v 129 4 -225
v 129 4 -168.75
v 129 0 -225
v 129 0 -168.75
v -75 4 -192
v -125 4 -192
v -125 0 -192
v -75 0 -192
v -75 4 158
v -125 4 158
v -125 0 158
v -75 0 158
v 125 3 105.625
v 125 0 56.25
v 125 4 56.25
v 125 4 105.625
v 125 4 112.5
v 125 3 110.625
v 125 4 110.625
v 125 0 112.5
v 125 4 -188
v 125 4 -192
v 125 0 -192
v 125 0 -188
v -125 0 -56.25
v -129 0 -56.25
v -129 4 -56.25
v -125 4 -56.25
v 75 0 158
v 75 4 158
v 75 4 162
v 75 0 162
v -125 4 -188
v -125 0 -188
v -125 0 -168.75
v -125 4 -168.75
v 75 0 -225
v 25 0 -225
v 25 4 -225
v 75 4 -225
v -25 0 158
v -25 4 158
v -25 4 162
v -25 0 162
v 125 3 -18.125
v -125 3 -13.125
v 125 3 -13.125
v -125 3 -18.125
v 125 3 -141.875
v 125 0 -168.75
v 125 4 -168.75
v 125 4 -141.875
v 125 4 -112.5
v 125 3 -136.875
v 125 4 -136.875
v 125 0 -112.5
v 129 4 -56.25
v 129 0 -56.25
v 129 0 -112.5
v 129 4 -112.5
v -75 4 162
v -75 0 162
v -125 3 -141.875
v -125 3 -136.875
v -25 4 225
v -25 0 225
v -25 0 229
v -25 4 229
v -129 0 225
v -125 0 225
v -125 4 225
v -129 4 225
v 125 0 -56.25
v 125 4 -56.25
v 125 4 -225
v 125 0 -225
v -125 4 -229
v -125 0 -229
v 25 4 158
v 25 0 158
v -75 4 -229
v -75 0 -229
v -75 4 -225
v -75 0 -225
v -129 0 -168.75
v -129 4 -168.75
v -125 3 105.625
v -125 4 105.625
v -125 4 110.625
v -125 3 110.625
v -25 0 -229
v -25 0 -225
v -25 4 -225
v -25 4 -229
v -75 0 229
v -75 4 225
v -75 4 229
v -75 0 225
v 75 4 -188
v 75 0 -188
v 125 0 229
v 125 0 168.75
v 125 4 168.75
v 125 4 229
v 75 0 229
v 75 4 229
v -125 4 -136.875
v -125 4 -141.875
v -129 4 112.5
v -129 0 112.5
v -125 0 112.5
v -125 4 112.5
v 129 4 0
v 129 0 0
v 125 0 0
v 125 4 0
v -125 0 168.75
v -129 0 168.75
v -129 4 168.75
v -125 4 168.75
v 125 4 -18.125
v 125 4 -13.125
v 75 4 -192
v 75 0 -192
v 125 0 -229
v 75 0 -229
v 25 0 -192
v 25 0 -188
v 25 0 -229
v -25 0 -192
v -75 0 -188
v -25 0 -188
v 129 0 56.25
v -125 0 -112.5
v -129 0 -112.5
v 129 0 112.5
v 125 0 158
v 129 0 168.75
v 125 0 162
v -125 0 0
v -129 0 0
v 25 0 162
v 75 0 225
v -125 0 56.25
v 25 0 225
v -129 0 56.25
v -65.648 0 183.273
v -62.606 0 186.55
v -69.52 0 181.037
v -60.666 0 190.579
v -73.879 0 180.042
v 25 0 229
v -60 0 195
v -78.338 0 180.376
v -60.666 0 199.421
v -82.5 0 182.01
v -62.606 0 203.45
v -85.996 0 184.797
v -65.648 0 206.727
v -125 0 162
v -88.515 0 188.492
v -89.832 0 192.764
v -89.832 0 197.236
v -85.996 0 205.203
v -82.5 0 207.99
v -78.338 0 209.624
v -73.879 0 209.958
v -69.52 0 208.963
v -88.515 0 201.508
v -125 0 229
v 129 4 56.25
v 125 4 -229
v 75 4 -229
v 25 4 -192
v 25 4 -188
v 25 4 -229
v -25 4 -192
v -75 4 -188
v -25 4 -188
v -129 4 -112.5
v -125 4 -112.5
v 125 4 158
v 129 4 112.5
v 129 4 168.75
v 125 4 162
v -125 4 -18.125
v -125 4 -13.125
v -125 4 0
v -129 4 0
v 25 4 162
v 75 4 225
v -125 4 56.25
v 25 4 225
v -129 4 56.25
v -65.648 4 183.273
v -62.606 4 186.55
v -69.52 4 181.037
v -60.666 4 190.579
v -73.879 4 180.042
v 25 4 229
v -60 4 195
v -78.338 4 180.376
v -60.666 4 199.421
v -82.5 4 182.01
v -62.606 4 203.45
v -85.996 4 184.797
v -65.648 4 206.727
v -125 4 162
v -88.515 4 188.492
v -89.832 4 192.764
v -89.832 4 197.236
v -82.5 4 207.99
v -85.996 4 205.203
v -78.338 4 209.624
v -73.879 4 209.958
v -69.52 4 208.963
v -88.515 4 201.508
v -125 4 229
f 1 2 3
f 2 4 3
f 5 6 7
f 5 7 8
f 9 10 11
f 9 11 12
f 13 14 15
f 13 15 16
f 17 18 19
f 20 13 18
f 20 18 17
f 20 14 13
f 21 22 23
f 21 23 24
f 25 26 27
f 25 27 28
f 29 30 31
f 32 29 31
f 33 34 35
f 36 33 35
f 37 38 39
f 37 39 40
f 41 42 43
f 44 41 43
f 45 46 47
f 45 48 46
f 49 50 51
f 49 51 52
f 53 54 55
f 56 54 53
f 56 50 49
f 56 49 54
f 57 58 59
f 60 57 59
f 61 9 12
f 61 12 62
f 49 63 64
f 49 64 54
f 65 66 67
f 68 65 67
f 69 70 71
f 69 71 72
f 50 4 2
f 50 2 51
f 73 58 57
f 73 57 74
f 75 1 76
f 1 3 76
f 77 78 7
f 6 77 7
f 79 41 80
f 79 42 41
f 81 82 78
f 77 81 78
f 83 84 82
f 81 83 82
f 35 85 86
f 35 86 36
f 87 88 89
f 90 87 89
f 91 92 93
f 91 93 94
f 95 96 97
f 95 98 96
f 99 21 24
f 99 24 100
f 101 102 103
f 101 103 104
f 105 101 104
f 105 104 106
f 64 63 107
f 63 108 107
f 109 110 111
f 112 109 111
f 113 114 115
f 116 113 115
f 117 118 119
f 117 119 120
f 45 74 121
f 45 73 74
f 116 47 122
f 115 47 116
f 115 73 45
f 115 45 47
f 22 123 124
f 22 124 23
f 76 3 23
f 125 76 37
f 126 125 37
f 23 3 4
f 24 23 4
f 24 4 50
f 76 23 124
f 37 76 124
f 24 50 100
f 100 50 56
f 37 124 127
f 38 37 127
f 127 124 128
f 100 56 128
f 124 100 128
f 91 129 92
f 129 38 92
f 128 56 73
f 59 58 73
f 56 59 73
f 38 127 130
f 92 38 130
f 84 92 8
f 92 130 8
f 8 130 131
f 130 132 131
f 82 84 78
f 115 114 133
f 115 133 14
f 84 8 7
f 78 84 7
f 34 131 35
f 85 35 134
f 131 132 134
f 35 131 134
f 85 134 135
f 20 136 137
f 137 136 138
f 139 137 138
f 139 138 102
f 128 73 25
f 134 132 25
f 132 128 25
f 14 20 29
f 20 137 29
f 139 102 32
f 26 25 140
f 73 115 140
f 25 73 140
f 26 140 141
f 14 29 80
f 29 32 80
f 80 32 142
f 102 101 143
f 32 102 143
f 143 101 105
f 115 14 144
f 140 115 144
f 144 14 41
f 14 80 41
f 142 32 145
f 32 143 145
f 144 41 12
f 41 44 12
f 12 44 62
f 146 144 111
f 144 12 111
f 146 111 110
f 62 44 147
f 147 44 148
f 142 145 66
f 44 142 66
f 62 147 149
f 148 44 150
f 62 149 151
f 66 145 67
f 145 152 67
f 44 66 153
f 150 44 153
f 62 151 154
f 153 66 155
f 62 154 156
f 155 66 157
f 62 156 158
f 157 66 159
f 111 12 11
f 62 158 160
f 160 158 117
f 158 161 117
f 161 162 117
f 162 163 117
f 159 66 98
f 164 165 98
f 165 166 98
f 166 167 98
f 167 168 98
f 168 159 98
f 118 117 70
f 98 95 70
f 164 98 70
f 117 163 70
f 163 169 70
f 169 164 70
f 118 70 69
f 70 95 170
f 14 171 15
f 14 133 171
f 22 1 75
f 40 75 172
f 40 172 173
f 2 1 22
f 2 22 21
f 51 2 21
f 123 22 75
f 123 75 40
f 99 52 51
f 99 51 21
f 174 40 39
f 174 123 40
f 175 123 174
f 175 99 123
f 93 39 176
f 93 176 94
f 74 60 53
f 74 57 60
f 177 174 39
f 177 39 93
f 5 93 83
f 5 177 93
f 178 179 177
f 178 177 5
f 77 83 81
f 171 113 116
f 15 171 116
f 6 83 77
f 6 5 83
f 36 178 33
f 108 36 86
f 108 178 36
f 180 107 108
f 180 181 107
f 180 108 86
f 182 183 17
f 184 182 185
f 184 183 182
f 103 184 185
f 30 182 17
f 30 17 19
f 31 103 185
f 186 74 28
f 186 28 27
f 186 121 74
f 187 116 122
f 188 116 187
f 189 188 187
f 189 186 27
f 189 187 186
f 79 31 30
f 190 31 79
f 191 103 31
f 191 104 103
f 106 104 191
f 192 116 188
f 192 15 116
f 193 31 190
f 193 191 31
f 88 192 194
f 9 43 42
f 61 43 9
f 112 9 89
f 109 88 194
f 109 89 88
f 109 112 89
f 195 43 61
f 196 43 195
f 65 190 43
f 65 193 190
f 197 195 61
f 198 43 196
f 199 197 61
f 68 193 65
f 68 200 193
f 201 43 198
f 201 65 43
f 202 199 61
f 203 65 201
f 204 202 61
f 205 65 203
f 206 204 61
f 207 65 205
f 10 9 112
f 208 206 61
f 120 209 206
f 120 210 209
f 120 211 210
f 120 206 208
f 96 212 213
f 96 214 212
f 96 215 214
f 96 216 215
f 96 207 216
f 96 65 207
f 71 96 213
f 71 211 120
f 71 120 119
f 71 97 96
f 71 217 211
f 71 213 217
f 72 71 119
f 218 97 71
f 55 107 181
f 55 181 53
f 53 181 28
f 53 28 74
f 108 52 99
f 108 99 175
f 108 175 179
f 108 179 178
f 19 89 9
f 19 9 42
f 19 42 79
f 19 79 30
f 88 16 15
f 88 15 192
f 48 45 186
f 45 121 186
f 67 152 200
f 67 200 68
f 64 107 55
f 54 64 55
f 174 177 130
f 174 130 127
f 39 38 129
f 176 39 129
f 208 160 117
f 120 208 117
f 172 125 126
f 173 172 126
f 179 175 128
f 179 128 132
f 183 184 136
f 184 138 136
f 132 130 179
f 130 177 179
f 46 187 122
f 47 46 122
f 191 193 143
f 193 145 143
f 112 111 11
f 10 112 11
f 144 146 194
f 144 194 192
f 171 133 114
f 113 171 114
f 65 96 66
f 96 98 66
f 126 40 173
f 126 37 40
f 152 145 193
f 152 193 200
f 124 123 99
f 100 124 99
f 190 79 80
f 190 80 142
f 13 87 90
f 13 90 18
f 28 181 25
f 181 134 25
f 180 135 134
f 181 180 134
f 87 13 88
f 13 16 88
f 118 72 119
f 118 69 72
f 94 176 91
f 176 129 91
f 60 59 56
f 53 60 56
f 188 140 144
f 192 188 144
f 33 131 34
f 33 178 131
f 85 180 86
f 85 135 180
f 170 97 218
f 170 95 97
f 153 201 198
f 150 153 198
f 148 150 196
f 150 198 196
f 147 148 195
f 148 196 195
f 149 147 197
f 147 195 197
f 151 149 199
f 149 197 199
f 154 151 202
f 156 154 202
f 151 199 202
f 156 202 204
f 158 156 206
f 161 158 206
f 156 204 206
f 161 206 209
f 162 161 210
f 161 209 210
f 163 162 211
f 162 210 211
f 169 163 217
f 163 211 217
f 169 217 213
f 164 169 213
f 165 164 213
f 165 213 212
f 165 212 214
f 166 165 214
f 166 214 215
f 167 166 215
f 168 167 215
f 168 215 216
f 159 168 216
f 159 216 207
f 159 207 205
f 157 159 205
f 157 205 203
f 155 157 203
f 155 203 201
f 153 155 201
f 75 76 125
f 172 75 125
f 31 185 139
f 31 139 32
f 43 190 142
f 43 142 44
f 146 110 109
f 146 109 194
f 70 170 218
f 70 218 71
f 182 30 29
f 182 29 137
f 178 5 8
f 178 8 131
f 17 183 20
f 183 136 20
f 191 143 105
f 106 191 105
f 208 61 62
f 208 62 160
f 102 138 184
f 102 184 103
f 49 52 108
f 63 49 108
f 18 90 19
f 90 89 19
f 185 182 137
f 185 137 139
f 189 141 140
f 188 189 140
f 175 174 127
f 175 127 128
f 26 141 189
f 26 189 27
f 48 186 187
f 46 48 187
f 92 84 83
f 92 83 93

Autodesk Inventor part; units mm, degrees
ref_plane "YZ Plane" through (0, 0, 0) normal (1, 0, 0) x (0, 1, 0)
ref_plane "XZ Plane" through (0, 0, 0) normal (0, 1, 0) x (-1, 0, 0)
ref_plane "XY Plane" through (0, 0, 0) normal (0, 0, 1) x (1, 0, 0)
sketch "Sketch1" plane through (0, 0, 0) normal (0, 1, 0) x (-1, 0, 0)
  line L0 (-125, 225) -> (125, 225) construction
  line L1 (125, 225) -> (125, -225) construction
  line L2 (125, -225) -> (-125, -225) construction
  line L3 (-125, -225) -> (-125, 225) construction
  line L4 (-125, 225) -> (125, -225) construction
  line L5 (125, 225) -> (-125, -225) construction
  line L6 (125, 225) -> (75, 225) construction
  line L7 (75, 225) -> (75, 229)
  line L8 (75, 229) -> (125, 229)
  line L9 (125, 229) -> (125, 225)
  line L10 (125, 225) -> (129, 225)
  line L11 (129, 225) -> (129, 168.75)
  line L12 (129, 168.75) -> (125, 168.75)
  line L13 (125, 168.75) -> (125, 225) construction
  line L14 (-125, 225) -> (-129, 225) construction
  line L15 (-129, 225) -> (-129, 168.75) construction
  line L16 (-129, 168.75) -> (-125, 168.75)
  line L17 (-125, 168.75) -> (-125, 225)
  line L18 (125, -225) -> (75, -225) construction
  line L19 (75, -225) -> (75, -229)
  line L20 (75, -229) -> (125, -229)
  line L21 (125, -229) -> (125, -225)
  line L22 (125, 112.5) -> (125, 168.75)
  line L23 (125, 168.75) -> (129, 168.75)
  line L24 (129, 112.5) -> (125, 112.5)
  line L25 (129, 168.75) -> (129, 112.5) construction
  line L26 (-125, 112.5) -> (-125, 168.75) construction
  line L27 (-125, 168.75) -> (-129, 168.75)
  line L28 (-129, 168.75) -> (-129, 112.5)
  line L29 (-129, 112.5) -> (-125, 112.5)
  line L30 (125, 56.25) -> (125, 112.5) construction
  line L31 (125, 112.5) -> (129, 112.5)
  line L32 (129, 56.25) -> (125, 56.25)
  line L33 (129, 112.5) -> (129, 56.25)
  line L34 (-125, 56.25) -> (-125, 112.5)
  line L35 (-125, 112.5) -> (-129, 112.5)
  line L36 (-129, 112.5) -> (-129, 56.25) construction
  line L37 (-129, 56.25) -> (-125, 56.25)
  line L38 (125, 0) -> (125, 56.25)
  line L39 (125, 56.25) -> (129, 56.25)
  line L40 (129, 0) -> (125, 0)
  line L41 (129, 56.25) -> (129, 0) construction
  line L42 (-125, 0) -> (-125, 56.25) construction
  line L43 (-125, 56.25) -> (-129, 56.25)
  line L44 (-129, 56.25) -> (-129, 0)
  line L45 (-129, 0) -> (-125, 0)
  line L46 (125, -56.25) -> (125, 0) construction
  line L47 (125, 0) -> (129, 0)
  line L48 (129, -56.25) -> (125, -56.25)
  line L49 (129, 0) -> (129, -56.25)
  line L50 (-125, -56.25) -> (-125, 0)
  line L51 (-125, 0) -> (-129, 0)
  line L52 (-129, 0) -> (-129, -56.25) construction
  line L53 (-129, -56.25) -> (-125, -56.25)
  line L54 (125, -112.5) -> (125, -56.25)
  line L55 (125, -56.25) -> (129, -56.25)
  line L56 (129, -112.5) -> (125, -112.5)
  line L57 (129, -56.25) -> (129, -112.5) construction
  line L58 (-125, -112.5) -> (-125, -56.25) construction
  line L59 (-125, -56.25) -> (-129, -56.25)
  line L60 (-129, -56.25) -> (-129, -112.5)
  line L61 (-129, -112.5) -> (-125, -112.5)
  line L62 (125, -168.75) -> (125, -112.5) construction
  line L63 (125, -112.5) -> (129, -112.5)
  line L64 (129, -168.75) -> (125, -168.75)
  line L65 (129, -112.5) -> (129, -168.75)
  line L66 (-125, -168.75) -> (-125, -112.5)
  line L67 (-125, -112.5) -> (-129, -112.5)
  line L68 (-129, -112.5) -> (-129, -168.75) construction
  line L69 (-129, -168.75) -> (-125, -168.75)
  line L70 (125, -225) -> (125, -168.75)
  line L71 (125, -168.75) -> (129, -168.75)
  line L72 (129, -225) -> (125, -225) construction
  line L73 (129, -168.75) -> (129, -225) construction
  line L74 (-125, -225) -> (-125, -168.75) construction
  line L75 (-125, -168.75) -> (-129, -168.75)
  line L76 (-129, -168.75) -> (-129, -225)
  line L77 (-129, -225) -> (-125, -225)
  line L78 (75, 229) -> (75, 225)
  line L79 (25, 225) -> (25, 229)
  line L80 (25, 229) -> (75, 229) construction
  line L81 (75, 225) -> (25, 225)
  line L82 (75, -225) -> (25, -225)
  line L83 (25, -225) -> (25, -229)
  line L84 (25, -229) -> (75, -229) construction
  line L85 (75, -229) -> (75, -225)
  line L86 (25, 229) -> (25, 225)
  line L87 (-25, 225) -> (-25, 229)
  line L88 (-25, 229) -> (25, 229)
  line L89 (25, 225) -> (-25, 225) construction
  line L90 (25, -225) -> (-25, -225) construction
  line L91 (-25, -225) -> (-25, -229)
  line L92 (-25, -229) -> (25, -229)
  line L93 (25, -229) -> (25, -225)
  line L94 (-25, 229) -> (-25, 225)
  line L95 (-75, 225) -> (-75, 229)
  line L96 (-75, 229) -> (-25, 229) construction
  line L97 (-25, 225) -> (-75, 225)
  line L98 (-25, -225) -> (-75, -225)
  line L99 (-75, -225) -> (-75, -229)
  line L100 (-75, -229) -> (-25, -229) construction
  line L101 (-25, -229) -> (-25, -225)
  line L102 (-75, 229) -> (-75, 225)
  line L103 (-125, 225) -> (-125, 229)
  line L104 (-125, 229) -> (-75, 229)
  line L105 (-75, 225) -> (-125, 225) construction
  line L106 (-75, -225) -> (-125, -225) construction
  line L107 (-125, -225) -> (-125, -229)
  line L108 (-125, -229) -> (-75, -229)
  line L109 (-75, -229) -> (-75, -225)
  point P0 (0, 0)
  point P1 (75, -225)
  point P2 (25, -225)
  point P3 (-25, -225)
  point P4 (-75, -225)
  point P5 (-129, 168.75)
  point P6 (-129, 56.25)
  point P7 (-129, -56.25)
  point P8 (-129, -168.75)
  point P9 (-125, -225)
  point P10 (-25, -225)
  point P11 (75, -225)
  point P12 (125, -56.25)
  point P13 (125, 56.25)
  point P14 (125, 168.75)
  dimension "d0" = 250
  dimension "d1" = 450
  dimension "d2" = 50
  dimension "d3" = 4
  dimension "d4" = 4
  dimension "d5" = 56.25
  dimension "d6" = 4
  dimension "d7" = 56.25
  dimension "d8" = 50
  dimension "d9" = 4
  dimension "d12" = 56.25
  dimension "d19" = 50
extrude "Extrusion1" add sketch "Sketch1" along normal blind 4
sketch "Sketch3" plane through (0, 4, 0) normal (0, 1, 0) x (1, 0, 0)
  line L0 (-129, 56.25) -> (-129, 0) projected
  line L1 (-129, 15.625) -> (125, 15.625) construction
  line L2 (125, 0) -> (125, 56.25) projected
  line L3 (-129, 13.125) -> (125, 13.125)
  line L4 (125, 13.125) -> (125, 18.125)
  line L5 (125, 18.125) -> (-129, 18.125)
  line L6 (-129, 18.125) -> (-129, 13.125)
  line L7 (-129, 18.125) -> (-125, 18.125)
  line L8 (-125, 18.125) -> (-125, 13.125)
  line L9 (-125, 13.125) -> (-129, 13.125)
  line L10 (-129, 13.125) -> (-129, 18.125)
  line L11 (-25, -225) -> (-25, -229) projected
  line L12 (-25, -229) -> (25, -229) projected
  line L13 (25, -229) -> (25, -225) projected
  line L14 (25, -225) -> (75, -225) projected
  line L15 (75, -225) -> (75, -229) projected
  line L16 (75, -229) -> (125, -229) projected
  line L17 (125, -229) -> (125, -168.75) projected
  line L18 (125, -168.75) -> (129, -168.75) projected
  line L19 (129, -168.75) -> (129, -112.5) projected
  line L20 (129, -112.5) -> (125, -112.5) projected
  line L21 (125, -112.5) -> (125, -56.25) projected
  line L22 (125, -56.25) -> (129, -56.25) projected
  line L23 (129, -56.25) -> (129, 0) projected
  line L24 (129, 0) -> (125, 0) projected
  line L25 (125, 0) -> (125, 56.25) projected
  line L26 (125, 56.25) -> (129, 56.25) projected
  line L27 (129, 56.25) -> (129, 112.5) projected
  line L28 (129, 112.5) -> (125, 112.5) projected
  line L29 (125, 112.5) -> (125, 168.75) projected
  line L30 (125, 168.75) -> (129, 168.75) projected
  line L31 (129, 168.75) -> (129, 225) projected
  line L32 (129, 225) -> (125, 225) projected
  line L33 (125, 225) -> (125, 229) projected
  line L34 (125, 229) -> (75, 229) projected
  line L35 (75, 229) -> (75, 225) projected
  line L36 (75, 225) -> (25, 225) projected
  line L37 (25, 225) -> (25, 229) projected
  line L38 (25, 229) -> (-25, 229) projected
  line L39 (-25, 229) -> (-25, 225) projected
  line L40 (-25, 225) -> (-75, 225) projected
  line L41 (-75, 225) -> (-75, 229) projected
  line L42 (-75, 229) -> (-125, 229) projected
  line L43 (-125, 229) -> (-125, 168.75) projected
  line L44 (-125, 168.75) -> (-129, 168.75) projected
  line L45 (-129, 168.75) -> (-129, 112.5) projected
  line L46 (-129, 112.5) -> (-125, 112.5) projected
  line L47 (-125, 112.5) -> (-125, 56.25) projected
  line L48 (-125, 56.25) -> (-129, 56.25) projected
  line L49 (-129, 56.25) -> (-129, 0) projected
  line L50 (-129, 0) -> (-125, 0) projected
  line L51 (-125, 0) -> (-125, -56.25) projected
  line L52 (-125, -56.25) -> (-129, -56.25) projected
  line L53 (-129, -56.25) -> (-129, -112.5) projected
  line L54 (-129, -112.5) -> (-125, -112.5) projected
  line L55 (-125, -112.5) -> (-125, -168.75) projected
  line L56 (-125, -168.75) -> (-129, -168.75) projected
  line L57 (-129, -168.75) -> (-129, -225) projected
  line L58 (-129, -225) -> (-125, -225) projected
  line L59 (-125, -225) -> (-125, -229) projected
  line L60 (-125, -229) -> (-75, -229) projected
  line L61 (-75, -229) -> (-75, -225) projected
  line L62 (-75, -225) -> (-25, -225) projected
  line L63 (-125, -112.5) -> (-125, -168.75) projected
  line L64 (-109.8402, -80.4521) -> (129, -140.625) construction
  line L65 (129, -168.75) -> (129, -112.5) projected
  line L66 (-125, -110.625) -> (125, -110.625)
  line L67 (125, -110.625) -> (125, -105.625)
  line L68 (125, -105.625) -> (-125, -105.625)
  line L69 (-125, -105.625) -> (-125, -110.625)
  line L70 (-125, -110.625) -> (125, -105.625) construction
  line L71 (125, -110.625) -> (-125, -105.625) construction
  line L72 (125, 0) -> (125, 56.25) projected
  line L73 (-125, 0) -> (-125, -56.25) projected
  line L74 (129, 168.75) -> (129, 225) projected
  line L75 (129, 139.375) -> (-125, 139.375) construction
  line L76 (-125, 136.875) -> (125, 136.875)
  line L77 (125, 136.875) -> (125, 141.875)
  line L78 (125, 141.875) -> (-125, 141.875)
  line L79 (-125, 141.875) -> (-125, 136.875)
  line L80 (-125, 136.875) -> (125, 141.875) construction
  line L81 (125, 136.875) -> (-125, 141.875) construction
  line L82 (-125, 229) -> (-125, 168.75) projected
  line L83 (125, 112.5) -> (125, 168.75) projected
  point P0 (0, 0)
  point P1 (-129, 18.125)
  point P2 (-125, 18.125)
  point P3 (-125, 13.125)
  point P4 (0, -108.125)
  point P5 (-125, -138.125)
  point P6 (-125, -143.125)
  point P7 (0, 139.375)
  point P8 (-125, 199.375)
  point P9 (-125, 194.375)
  dimension "d30" = 5
  dimension "d34" = 5
  dimension "d35" = 5
  dimension "d36" = 5
  dimension "d56" = 118.375
  dimension "d57" = 118.75
  dimension "d59" = 118.75
extrude "Extrusion2" cut sketch "Sketch3" against normal blind 1 contours L5 L2 L3 L8 | L76 L79 L78 L29 | L21 L66 L69 L68
sketch "Sketch4" plane through (0, 4, 0) normal (0, 1, 0) x (1, 0, 0)
  line L0 (-125, -158) -> (-75, -158)
  line L1 (-75, -158) -> (-75, -162)
  line L2 (-75, -162) -> (-125, -162)
  line L3 (-125, -162) -> (-125, -158)
  line L4 (-75, -225) -> (-25, -225) projected
  line L5 (125, -110.625) -> (-125, -110.625) projected
  line L6 (-75, -158) -> (-25, -158)
  line L7 (-25, -158) -> (-25, -162)
  line L8 (-25, -162) -> (-75, -162)
  line L9 (-75, -162) -> (-75, -158)
  line L10 (-25, -158) -> (25, -158)
  line L11 (25, -158) -> (25, -162)
  line L12 (25, -162) -> (-25, -162)
  line L13 (-25, -162) -> (-25, -158)
  line L14 (25, -158) -> (75, -158)
  line L15 (75, -158) -> (75, -162)
  line L16 (75, -162) -> (25, -162)
  line L17 (25, -162) -> (25, -158)
  line L18 (75, -158) -> (125, -158)
  line L19 (125, -158) -> (125, -162)
  line L20 (125, -162) -> (75, -162)
  line L21 (75, -162) -> (75, -158)
  line L22 (-125, 0) -> (-125, -56.25) projected
  line L23 (-125, 192) -> (-75, 192)
  line L24 (-75, 192) -> (-75, 188)
  line L25 (-75, 188) -> (-125, 188)
  line L26 (-125, 188) -> (-125, 192)
  line L27 (-75, 192) -> (-25, 192)
  line L28 (-25, 192) -> (-25, 188)
  line L29 (-25, 188) -> (-25, 192)
  line L30 (-25, 188) -> (-75, 188)
  line L31 (-75, 188) -> (-75, 192)
  line L32 (-25, 192) -> (25, 192)
  line L33 (25, 188) -> (-25, 188)
  line L34 (25, 192) -> (25, 188)
  line L35 (25, 188) -> (25, 192)
  line L36 (25, 192) -> (75, 192)
  line L37 (75, 192) -> (75, 188)
  line L38 (75, 188) -> (75, 192)
  line L39 (75, 192) -> (125, 192)
  line L40 (125, 192) -> (125, 188)
  line L41 (125, 188) -> (75, 188)
  line L42 (75, 188) -> (25, 188)
  point P0 (0, 0)
  point P1 (-125, -160)
  point P2 (-75, -160)
  point P3 (-25, -160)
  point P4 (25, -160)
  point P5 (75, -160)
  point P6 (-25, -162)
  point P7 (-125, 190)
  point P8 (-25, 190)
  point P9 (-75, 190)
  point P10 (25, 190)
  point P11 (75, 190)
  point P12 (-25, 188)
  point P13 (-125, -168.75)
  dimension "d37" = 50
  dimension "d38" = 4
  dimension "d39" = 63
  dimension "d42" = 50
  dimension "d51" = 350
extrude "Extrusion3" cut sketch "Sketch4" against normal up to next contours L0 L1 L2 L3 | L10 L11 L12 L7 | L18 L19 L20 L15 | L23 L24 L25 L26 | L32 L34 L33 L28 | L39 L40 L41 L37
sketch "Sketch6" plane through (0, 4, 0) normal (0, 1, 0) x (1, 0, 0)
  circle A0 centre (-75, -195) radius 15
  line L0 (-75, -225) -> (-25, -225) projected
  line L1 (-125, -162) -> (-125, -168.75) projected
  point P0 (0, 0)
  point P1 (-125, -165.375)
  dimension "d60" = 30
  dimension "d61" = 30
  dimension "d62" = 50
extrude "Extrusion4" cut sketch "Sketch6" against normal through all
properties part number "Rear_V2"
